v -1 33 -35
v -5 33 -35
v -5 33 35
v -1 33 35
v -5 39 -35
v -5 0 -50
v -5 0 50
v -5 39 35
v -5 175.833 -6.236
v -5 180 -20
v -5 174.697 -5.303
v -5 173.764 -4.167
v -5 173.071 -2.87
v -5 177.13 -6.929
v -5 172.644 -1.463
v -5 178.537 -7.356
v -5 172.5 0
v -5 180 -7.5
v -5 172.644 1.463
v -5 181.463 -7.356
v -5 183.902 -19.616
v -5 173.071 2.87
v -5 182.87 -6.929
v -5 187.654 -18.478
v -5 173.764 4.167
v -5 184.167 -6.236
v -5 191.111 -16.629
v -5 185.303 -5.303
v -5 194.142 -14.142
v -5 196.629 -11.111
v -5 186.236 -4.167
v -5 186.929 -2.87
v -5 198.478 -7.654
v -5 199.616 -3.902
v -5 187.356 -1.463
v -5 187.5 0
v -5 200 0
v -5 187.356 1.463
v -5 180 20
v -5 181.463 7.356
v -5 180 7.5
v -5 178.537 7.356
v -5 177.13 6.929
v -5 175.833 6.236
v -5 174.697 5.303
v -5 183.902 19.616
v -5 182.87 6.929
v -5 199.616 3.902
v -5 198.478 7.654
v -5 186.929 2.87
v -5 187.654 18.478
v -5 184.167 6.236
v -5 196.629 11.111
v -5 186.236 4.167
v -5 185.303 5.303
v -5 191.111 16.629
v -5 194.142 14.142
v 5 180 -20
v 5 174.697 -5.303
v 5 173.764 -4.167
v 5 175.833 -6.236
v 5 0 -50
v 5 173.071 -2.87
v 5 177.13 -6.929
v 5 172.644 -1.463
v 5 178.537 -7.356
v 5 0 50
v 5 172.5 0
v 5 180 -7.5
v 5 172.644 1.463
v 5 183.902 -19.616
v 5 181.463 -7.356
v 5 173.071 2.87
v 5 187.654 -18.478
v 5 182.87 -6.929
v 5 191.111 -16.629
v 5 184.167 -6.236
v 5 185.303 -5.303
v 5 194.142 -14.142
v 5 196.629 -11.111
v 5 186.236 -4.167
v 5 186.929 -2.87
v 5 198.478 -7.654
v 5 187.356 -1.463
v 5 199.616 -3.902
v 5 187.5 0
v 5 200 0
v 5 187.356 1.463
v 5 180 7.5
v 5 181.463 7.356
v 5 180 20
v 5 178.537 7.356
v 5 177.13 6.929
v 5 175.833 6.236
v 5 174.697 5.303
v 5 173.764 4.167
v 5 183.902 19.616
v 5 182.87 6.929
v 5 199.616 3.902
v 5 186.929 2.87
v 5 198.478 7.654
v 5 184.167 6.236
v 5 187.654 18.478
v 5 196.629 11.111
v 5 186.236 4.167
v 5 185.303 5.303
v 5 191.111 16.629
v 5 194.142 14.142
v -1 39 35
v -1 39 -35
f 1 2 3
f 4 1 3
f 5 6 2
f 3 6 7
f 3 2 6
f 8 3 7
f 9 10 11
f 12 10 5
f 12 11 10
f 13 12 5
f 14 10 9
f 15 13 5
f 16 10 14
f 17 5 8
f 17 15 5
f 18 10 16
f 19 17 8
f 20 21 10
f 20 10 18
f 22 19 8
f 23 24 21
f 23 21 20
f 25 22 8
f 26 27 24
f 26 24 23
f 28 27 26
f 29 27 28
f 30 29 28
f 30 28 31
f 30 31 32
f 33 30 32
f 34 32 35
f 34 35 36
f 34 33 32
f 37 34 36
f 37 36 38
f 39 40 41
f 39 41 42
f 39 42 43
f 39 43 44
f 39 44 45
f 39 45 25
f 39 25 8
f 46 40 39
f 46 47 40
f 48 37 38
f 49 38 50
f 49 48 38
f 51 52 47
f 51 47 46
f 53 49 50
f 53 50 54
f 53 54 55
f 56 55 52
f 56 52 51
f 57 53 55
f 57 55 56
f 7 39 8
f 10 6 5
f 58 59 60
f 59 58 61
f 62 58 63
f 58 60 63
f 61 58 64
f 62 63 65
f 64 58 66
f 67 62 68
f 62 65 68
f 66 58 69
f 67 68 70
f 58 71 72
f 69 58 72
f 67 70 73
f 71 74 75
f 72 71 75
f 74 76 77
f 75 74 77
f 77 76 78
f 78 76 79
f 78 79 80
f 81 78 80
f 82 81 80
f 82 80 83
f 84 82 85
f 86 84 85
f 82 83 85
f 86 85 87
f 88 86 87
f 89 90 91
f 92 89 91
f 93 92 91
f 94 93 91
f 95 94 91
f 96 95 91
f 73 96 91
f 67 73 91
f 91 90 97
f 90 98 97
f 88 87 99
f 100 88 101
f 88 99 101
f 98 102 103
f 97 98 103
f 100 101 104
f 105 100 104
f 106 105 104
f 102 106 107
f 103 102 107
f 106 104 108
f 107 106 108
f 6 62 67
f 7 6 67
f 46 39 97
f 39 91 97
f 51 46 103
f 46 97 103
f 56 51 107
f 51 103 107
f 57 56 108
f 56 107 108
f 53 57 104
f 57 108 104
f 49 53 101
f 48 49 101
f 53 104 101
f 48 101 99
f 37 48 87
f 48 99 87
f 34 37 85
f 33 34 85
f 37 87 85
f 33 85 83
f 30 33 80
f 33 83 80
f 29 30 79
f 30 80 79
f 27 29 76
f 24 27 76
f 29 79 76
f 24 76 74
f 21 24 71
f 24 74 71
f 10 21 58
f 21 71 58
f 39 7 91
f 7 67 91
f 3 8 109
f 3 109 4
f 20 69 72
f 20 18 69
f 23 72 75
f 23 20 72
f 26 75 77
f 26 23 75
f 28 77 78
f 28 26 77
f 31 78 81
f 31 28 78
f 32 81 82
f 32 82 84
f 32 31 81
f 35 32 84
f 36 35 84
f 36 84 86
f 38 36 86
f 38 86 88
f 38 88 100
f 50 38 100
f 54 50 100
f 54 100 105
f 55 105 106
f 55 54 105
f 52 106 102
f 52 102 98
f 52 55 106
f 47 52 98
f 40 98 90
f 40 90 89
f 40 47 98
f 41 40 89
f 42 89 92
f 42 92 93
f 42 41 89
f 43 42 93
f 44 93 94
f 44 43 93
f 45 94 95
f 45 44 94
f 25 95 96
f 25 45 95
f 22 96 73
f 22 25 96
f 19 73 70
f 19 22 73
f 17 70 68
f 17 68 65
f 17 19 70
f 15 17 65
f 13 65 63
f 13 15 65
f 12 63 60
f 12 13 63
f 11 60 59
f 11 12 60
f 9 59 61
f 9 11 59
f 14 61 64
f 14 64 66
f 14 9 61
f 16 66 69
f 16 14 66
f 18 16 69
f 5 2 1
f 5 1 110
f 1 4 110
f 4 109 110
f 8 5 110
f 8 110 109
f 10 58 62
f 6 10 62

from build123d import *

# Parameters (mm, degrees)
SKETCH2_R           = 7.5
BOSS_EXTRUDE1_DEPTH = 5
CUT_EXTRUDE1_DEPTH  = 4


with BuildPart() as part:
    # Sketch2 → Boss-Extrude1 (new, symmetric)
    with BuildSketch(Plane(origin=(0, 0, 0), x_dir=(0, 0, -1), z_dir=(1, 0, 0))):
        with BuildLine():
            Line((50, 0), (-50, 0))
            Line((-50, 0), (-20, 180))
            ThreePointArc((-20, 180), (0, 200), (20, 180))
            Line((20, 180), (50, 0))
        make_face()
        with Locations((0, 180)):
            Circle(SKETCH2_R, mode=Mode.SUBTRACT)
    extrude(amount=BOSS_EXTRUDE1_DEPTH, both=True)

    # Sketch3 → Cut-Extrude1 (cut)
    with BuildSketch(Plane.ZY.offset(5)):
        Polygon((0, 33), (-35, 33), (-35, 39), (35, 39), (35, 33), align=None)
    extrude(amount=-CUT_EXTRUDE1_DEPTH, mode=Mode.SUBTRACT)


solid = part.part
